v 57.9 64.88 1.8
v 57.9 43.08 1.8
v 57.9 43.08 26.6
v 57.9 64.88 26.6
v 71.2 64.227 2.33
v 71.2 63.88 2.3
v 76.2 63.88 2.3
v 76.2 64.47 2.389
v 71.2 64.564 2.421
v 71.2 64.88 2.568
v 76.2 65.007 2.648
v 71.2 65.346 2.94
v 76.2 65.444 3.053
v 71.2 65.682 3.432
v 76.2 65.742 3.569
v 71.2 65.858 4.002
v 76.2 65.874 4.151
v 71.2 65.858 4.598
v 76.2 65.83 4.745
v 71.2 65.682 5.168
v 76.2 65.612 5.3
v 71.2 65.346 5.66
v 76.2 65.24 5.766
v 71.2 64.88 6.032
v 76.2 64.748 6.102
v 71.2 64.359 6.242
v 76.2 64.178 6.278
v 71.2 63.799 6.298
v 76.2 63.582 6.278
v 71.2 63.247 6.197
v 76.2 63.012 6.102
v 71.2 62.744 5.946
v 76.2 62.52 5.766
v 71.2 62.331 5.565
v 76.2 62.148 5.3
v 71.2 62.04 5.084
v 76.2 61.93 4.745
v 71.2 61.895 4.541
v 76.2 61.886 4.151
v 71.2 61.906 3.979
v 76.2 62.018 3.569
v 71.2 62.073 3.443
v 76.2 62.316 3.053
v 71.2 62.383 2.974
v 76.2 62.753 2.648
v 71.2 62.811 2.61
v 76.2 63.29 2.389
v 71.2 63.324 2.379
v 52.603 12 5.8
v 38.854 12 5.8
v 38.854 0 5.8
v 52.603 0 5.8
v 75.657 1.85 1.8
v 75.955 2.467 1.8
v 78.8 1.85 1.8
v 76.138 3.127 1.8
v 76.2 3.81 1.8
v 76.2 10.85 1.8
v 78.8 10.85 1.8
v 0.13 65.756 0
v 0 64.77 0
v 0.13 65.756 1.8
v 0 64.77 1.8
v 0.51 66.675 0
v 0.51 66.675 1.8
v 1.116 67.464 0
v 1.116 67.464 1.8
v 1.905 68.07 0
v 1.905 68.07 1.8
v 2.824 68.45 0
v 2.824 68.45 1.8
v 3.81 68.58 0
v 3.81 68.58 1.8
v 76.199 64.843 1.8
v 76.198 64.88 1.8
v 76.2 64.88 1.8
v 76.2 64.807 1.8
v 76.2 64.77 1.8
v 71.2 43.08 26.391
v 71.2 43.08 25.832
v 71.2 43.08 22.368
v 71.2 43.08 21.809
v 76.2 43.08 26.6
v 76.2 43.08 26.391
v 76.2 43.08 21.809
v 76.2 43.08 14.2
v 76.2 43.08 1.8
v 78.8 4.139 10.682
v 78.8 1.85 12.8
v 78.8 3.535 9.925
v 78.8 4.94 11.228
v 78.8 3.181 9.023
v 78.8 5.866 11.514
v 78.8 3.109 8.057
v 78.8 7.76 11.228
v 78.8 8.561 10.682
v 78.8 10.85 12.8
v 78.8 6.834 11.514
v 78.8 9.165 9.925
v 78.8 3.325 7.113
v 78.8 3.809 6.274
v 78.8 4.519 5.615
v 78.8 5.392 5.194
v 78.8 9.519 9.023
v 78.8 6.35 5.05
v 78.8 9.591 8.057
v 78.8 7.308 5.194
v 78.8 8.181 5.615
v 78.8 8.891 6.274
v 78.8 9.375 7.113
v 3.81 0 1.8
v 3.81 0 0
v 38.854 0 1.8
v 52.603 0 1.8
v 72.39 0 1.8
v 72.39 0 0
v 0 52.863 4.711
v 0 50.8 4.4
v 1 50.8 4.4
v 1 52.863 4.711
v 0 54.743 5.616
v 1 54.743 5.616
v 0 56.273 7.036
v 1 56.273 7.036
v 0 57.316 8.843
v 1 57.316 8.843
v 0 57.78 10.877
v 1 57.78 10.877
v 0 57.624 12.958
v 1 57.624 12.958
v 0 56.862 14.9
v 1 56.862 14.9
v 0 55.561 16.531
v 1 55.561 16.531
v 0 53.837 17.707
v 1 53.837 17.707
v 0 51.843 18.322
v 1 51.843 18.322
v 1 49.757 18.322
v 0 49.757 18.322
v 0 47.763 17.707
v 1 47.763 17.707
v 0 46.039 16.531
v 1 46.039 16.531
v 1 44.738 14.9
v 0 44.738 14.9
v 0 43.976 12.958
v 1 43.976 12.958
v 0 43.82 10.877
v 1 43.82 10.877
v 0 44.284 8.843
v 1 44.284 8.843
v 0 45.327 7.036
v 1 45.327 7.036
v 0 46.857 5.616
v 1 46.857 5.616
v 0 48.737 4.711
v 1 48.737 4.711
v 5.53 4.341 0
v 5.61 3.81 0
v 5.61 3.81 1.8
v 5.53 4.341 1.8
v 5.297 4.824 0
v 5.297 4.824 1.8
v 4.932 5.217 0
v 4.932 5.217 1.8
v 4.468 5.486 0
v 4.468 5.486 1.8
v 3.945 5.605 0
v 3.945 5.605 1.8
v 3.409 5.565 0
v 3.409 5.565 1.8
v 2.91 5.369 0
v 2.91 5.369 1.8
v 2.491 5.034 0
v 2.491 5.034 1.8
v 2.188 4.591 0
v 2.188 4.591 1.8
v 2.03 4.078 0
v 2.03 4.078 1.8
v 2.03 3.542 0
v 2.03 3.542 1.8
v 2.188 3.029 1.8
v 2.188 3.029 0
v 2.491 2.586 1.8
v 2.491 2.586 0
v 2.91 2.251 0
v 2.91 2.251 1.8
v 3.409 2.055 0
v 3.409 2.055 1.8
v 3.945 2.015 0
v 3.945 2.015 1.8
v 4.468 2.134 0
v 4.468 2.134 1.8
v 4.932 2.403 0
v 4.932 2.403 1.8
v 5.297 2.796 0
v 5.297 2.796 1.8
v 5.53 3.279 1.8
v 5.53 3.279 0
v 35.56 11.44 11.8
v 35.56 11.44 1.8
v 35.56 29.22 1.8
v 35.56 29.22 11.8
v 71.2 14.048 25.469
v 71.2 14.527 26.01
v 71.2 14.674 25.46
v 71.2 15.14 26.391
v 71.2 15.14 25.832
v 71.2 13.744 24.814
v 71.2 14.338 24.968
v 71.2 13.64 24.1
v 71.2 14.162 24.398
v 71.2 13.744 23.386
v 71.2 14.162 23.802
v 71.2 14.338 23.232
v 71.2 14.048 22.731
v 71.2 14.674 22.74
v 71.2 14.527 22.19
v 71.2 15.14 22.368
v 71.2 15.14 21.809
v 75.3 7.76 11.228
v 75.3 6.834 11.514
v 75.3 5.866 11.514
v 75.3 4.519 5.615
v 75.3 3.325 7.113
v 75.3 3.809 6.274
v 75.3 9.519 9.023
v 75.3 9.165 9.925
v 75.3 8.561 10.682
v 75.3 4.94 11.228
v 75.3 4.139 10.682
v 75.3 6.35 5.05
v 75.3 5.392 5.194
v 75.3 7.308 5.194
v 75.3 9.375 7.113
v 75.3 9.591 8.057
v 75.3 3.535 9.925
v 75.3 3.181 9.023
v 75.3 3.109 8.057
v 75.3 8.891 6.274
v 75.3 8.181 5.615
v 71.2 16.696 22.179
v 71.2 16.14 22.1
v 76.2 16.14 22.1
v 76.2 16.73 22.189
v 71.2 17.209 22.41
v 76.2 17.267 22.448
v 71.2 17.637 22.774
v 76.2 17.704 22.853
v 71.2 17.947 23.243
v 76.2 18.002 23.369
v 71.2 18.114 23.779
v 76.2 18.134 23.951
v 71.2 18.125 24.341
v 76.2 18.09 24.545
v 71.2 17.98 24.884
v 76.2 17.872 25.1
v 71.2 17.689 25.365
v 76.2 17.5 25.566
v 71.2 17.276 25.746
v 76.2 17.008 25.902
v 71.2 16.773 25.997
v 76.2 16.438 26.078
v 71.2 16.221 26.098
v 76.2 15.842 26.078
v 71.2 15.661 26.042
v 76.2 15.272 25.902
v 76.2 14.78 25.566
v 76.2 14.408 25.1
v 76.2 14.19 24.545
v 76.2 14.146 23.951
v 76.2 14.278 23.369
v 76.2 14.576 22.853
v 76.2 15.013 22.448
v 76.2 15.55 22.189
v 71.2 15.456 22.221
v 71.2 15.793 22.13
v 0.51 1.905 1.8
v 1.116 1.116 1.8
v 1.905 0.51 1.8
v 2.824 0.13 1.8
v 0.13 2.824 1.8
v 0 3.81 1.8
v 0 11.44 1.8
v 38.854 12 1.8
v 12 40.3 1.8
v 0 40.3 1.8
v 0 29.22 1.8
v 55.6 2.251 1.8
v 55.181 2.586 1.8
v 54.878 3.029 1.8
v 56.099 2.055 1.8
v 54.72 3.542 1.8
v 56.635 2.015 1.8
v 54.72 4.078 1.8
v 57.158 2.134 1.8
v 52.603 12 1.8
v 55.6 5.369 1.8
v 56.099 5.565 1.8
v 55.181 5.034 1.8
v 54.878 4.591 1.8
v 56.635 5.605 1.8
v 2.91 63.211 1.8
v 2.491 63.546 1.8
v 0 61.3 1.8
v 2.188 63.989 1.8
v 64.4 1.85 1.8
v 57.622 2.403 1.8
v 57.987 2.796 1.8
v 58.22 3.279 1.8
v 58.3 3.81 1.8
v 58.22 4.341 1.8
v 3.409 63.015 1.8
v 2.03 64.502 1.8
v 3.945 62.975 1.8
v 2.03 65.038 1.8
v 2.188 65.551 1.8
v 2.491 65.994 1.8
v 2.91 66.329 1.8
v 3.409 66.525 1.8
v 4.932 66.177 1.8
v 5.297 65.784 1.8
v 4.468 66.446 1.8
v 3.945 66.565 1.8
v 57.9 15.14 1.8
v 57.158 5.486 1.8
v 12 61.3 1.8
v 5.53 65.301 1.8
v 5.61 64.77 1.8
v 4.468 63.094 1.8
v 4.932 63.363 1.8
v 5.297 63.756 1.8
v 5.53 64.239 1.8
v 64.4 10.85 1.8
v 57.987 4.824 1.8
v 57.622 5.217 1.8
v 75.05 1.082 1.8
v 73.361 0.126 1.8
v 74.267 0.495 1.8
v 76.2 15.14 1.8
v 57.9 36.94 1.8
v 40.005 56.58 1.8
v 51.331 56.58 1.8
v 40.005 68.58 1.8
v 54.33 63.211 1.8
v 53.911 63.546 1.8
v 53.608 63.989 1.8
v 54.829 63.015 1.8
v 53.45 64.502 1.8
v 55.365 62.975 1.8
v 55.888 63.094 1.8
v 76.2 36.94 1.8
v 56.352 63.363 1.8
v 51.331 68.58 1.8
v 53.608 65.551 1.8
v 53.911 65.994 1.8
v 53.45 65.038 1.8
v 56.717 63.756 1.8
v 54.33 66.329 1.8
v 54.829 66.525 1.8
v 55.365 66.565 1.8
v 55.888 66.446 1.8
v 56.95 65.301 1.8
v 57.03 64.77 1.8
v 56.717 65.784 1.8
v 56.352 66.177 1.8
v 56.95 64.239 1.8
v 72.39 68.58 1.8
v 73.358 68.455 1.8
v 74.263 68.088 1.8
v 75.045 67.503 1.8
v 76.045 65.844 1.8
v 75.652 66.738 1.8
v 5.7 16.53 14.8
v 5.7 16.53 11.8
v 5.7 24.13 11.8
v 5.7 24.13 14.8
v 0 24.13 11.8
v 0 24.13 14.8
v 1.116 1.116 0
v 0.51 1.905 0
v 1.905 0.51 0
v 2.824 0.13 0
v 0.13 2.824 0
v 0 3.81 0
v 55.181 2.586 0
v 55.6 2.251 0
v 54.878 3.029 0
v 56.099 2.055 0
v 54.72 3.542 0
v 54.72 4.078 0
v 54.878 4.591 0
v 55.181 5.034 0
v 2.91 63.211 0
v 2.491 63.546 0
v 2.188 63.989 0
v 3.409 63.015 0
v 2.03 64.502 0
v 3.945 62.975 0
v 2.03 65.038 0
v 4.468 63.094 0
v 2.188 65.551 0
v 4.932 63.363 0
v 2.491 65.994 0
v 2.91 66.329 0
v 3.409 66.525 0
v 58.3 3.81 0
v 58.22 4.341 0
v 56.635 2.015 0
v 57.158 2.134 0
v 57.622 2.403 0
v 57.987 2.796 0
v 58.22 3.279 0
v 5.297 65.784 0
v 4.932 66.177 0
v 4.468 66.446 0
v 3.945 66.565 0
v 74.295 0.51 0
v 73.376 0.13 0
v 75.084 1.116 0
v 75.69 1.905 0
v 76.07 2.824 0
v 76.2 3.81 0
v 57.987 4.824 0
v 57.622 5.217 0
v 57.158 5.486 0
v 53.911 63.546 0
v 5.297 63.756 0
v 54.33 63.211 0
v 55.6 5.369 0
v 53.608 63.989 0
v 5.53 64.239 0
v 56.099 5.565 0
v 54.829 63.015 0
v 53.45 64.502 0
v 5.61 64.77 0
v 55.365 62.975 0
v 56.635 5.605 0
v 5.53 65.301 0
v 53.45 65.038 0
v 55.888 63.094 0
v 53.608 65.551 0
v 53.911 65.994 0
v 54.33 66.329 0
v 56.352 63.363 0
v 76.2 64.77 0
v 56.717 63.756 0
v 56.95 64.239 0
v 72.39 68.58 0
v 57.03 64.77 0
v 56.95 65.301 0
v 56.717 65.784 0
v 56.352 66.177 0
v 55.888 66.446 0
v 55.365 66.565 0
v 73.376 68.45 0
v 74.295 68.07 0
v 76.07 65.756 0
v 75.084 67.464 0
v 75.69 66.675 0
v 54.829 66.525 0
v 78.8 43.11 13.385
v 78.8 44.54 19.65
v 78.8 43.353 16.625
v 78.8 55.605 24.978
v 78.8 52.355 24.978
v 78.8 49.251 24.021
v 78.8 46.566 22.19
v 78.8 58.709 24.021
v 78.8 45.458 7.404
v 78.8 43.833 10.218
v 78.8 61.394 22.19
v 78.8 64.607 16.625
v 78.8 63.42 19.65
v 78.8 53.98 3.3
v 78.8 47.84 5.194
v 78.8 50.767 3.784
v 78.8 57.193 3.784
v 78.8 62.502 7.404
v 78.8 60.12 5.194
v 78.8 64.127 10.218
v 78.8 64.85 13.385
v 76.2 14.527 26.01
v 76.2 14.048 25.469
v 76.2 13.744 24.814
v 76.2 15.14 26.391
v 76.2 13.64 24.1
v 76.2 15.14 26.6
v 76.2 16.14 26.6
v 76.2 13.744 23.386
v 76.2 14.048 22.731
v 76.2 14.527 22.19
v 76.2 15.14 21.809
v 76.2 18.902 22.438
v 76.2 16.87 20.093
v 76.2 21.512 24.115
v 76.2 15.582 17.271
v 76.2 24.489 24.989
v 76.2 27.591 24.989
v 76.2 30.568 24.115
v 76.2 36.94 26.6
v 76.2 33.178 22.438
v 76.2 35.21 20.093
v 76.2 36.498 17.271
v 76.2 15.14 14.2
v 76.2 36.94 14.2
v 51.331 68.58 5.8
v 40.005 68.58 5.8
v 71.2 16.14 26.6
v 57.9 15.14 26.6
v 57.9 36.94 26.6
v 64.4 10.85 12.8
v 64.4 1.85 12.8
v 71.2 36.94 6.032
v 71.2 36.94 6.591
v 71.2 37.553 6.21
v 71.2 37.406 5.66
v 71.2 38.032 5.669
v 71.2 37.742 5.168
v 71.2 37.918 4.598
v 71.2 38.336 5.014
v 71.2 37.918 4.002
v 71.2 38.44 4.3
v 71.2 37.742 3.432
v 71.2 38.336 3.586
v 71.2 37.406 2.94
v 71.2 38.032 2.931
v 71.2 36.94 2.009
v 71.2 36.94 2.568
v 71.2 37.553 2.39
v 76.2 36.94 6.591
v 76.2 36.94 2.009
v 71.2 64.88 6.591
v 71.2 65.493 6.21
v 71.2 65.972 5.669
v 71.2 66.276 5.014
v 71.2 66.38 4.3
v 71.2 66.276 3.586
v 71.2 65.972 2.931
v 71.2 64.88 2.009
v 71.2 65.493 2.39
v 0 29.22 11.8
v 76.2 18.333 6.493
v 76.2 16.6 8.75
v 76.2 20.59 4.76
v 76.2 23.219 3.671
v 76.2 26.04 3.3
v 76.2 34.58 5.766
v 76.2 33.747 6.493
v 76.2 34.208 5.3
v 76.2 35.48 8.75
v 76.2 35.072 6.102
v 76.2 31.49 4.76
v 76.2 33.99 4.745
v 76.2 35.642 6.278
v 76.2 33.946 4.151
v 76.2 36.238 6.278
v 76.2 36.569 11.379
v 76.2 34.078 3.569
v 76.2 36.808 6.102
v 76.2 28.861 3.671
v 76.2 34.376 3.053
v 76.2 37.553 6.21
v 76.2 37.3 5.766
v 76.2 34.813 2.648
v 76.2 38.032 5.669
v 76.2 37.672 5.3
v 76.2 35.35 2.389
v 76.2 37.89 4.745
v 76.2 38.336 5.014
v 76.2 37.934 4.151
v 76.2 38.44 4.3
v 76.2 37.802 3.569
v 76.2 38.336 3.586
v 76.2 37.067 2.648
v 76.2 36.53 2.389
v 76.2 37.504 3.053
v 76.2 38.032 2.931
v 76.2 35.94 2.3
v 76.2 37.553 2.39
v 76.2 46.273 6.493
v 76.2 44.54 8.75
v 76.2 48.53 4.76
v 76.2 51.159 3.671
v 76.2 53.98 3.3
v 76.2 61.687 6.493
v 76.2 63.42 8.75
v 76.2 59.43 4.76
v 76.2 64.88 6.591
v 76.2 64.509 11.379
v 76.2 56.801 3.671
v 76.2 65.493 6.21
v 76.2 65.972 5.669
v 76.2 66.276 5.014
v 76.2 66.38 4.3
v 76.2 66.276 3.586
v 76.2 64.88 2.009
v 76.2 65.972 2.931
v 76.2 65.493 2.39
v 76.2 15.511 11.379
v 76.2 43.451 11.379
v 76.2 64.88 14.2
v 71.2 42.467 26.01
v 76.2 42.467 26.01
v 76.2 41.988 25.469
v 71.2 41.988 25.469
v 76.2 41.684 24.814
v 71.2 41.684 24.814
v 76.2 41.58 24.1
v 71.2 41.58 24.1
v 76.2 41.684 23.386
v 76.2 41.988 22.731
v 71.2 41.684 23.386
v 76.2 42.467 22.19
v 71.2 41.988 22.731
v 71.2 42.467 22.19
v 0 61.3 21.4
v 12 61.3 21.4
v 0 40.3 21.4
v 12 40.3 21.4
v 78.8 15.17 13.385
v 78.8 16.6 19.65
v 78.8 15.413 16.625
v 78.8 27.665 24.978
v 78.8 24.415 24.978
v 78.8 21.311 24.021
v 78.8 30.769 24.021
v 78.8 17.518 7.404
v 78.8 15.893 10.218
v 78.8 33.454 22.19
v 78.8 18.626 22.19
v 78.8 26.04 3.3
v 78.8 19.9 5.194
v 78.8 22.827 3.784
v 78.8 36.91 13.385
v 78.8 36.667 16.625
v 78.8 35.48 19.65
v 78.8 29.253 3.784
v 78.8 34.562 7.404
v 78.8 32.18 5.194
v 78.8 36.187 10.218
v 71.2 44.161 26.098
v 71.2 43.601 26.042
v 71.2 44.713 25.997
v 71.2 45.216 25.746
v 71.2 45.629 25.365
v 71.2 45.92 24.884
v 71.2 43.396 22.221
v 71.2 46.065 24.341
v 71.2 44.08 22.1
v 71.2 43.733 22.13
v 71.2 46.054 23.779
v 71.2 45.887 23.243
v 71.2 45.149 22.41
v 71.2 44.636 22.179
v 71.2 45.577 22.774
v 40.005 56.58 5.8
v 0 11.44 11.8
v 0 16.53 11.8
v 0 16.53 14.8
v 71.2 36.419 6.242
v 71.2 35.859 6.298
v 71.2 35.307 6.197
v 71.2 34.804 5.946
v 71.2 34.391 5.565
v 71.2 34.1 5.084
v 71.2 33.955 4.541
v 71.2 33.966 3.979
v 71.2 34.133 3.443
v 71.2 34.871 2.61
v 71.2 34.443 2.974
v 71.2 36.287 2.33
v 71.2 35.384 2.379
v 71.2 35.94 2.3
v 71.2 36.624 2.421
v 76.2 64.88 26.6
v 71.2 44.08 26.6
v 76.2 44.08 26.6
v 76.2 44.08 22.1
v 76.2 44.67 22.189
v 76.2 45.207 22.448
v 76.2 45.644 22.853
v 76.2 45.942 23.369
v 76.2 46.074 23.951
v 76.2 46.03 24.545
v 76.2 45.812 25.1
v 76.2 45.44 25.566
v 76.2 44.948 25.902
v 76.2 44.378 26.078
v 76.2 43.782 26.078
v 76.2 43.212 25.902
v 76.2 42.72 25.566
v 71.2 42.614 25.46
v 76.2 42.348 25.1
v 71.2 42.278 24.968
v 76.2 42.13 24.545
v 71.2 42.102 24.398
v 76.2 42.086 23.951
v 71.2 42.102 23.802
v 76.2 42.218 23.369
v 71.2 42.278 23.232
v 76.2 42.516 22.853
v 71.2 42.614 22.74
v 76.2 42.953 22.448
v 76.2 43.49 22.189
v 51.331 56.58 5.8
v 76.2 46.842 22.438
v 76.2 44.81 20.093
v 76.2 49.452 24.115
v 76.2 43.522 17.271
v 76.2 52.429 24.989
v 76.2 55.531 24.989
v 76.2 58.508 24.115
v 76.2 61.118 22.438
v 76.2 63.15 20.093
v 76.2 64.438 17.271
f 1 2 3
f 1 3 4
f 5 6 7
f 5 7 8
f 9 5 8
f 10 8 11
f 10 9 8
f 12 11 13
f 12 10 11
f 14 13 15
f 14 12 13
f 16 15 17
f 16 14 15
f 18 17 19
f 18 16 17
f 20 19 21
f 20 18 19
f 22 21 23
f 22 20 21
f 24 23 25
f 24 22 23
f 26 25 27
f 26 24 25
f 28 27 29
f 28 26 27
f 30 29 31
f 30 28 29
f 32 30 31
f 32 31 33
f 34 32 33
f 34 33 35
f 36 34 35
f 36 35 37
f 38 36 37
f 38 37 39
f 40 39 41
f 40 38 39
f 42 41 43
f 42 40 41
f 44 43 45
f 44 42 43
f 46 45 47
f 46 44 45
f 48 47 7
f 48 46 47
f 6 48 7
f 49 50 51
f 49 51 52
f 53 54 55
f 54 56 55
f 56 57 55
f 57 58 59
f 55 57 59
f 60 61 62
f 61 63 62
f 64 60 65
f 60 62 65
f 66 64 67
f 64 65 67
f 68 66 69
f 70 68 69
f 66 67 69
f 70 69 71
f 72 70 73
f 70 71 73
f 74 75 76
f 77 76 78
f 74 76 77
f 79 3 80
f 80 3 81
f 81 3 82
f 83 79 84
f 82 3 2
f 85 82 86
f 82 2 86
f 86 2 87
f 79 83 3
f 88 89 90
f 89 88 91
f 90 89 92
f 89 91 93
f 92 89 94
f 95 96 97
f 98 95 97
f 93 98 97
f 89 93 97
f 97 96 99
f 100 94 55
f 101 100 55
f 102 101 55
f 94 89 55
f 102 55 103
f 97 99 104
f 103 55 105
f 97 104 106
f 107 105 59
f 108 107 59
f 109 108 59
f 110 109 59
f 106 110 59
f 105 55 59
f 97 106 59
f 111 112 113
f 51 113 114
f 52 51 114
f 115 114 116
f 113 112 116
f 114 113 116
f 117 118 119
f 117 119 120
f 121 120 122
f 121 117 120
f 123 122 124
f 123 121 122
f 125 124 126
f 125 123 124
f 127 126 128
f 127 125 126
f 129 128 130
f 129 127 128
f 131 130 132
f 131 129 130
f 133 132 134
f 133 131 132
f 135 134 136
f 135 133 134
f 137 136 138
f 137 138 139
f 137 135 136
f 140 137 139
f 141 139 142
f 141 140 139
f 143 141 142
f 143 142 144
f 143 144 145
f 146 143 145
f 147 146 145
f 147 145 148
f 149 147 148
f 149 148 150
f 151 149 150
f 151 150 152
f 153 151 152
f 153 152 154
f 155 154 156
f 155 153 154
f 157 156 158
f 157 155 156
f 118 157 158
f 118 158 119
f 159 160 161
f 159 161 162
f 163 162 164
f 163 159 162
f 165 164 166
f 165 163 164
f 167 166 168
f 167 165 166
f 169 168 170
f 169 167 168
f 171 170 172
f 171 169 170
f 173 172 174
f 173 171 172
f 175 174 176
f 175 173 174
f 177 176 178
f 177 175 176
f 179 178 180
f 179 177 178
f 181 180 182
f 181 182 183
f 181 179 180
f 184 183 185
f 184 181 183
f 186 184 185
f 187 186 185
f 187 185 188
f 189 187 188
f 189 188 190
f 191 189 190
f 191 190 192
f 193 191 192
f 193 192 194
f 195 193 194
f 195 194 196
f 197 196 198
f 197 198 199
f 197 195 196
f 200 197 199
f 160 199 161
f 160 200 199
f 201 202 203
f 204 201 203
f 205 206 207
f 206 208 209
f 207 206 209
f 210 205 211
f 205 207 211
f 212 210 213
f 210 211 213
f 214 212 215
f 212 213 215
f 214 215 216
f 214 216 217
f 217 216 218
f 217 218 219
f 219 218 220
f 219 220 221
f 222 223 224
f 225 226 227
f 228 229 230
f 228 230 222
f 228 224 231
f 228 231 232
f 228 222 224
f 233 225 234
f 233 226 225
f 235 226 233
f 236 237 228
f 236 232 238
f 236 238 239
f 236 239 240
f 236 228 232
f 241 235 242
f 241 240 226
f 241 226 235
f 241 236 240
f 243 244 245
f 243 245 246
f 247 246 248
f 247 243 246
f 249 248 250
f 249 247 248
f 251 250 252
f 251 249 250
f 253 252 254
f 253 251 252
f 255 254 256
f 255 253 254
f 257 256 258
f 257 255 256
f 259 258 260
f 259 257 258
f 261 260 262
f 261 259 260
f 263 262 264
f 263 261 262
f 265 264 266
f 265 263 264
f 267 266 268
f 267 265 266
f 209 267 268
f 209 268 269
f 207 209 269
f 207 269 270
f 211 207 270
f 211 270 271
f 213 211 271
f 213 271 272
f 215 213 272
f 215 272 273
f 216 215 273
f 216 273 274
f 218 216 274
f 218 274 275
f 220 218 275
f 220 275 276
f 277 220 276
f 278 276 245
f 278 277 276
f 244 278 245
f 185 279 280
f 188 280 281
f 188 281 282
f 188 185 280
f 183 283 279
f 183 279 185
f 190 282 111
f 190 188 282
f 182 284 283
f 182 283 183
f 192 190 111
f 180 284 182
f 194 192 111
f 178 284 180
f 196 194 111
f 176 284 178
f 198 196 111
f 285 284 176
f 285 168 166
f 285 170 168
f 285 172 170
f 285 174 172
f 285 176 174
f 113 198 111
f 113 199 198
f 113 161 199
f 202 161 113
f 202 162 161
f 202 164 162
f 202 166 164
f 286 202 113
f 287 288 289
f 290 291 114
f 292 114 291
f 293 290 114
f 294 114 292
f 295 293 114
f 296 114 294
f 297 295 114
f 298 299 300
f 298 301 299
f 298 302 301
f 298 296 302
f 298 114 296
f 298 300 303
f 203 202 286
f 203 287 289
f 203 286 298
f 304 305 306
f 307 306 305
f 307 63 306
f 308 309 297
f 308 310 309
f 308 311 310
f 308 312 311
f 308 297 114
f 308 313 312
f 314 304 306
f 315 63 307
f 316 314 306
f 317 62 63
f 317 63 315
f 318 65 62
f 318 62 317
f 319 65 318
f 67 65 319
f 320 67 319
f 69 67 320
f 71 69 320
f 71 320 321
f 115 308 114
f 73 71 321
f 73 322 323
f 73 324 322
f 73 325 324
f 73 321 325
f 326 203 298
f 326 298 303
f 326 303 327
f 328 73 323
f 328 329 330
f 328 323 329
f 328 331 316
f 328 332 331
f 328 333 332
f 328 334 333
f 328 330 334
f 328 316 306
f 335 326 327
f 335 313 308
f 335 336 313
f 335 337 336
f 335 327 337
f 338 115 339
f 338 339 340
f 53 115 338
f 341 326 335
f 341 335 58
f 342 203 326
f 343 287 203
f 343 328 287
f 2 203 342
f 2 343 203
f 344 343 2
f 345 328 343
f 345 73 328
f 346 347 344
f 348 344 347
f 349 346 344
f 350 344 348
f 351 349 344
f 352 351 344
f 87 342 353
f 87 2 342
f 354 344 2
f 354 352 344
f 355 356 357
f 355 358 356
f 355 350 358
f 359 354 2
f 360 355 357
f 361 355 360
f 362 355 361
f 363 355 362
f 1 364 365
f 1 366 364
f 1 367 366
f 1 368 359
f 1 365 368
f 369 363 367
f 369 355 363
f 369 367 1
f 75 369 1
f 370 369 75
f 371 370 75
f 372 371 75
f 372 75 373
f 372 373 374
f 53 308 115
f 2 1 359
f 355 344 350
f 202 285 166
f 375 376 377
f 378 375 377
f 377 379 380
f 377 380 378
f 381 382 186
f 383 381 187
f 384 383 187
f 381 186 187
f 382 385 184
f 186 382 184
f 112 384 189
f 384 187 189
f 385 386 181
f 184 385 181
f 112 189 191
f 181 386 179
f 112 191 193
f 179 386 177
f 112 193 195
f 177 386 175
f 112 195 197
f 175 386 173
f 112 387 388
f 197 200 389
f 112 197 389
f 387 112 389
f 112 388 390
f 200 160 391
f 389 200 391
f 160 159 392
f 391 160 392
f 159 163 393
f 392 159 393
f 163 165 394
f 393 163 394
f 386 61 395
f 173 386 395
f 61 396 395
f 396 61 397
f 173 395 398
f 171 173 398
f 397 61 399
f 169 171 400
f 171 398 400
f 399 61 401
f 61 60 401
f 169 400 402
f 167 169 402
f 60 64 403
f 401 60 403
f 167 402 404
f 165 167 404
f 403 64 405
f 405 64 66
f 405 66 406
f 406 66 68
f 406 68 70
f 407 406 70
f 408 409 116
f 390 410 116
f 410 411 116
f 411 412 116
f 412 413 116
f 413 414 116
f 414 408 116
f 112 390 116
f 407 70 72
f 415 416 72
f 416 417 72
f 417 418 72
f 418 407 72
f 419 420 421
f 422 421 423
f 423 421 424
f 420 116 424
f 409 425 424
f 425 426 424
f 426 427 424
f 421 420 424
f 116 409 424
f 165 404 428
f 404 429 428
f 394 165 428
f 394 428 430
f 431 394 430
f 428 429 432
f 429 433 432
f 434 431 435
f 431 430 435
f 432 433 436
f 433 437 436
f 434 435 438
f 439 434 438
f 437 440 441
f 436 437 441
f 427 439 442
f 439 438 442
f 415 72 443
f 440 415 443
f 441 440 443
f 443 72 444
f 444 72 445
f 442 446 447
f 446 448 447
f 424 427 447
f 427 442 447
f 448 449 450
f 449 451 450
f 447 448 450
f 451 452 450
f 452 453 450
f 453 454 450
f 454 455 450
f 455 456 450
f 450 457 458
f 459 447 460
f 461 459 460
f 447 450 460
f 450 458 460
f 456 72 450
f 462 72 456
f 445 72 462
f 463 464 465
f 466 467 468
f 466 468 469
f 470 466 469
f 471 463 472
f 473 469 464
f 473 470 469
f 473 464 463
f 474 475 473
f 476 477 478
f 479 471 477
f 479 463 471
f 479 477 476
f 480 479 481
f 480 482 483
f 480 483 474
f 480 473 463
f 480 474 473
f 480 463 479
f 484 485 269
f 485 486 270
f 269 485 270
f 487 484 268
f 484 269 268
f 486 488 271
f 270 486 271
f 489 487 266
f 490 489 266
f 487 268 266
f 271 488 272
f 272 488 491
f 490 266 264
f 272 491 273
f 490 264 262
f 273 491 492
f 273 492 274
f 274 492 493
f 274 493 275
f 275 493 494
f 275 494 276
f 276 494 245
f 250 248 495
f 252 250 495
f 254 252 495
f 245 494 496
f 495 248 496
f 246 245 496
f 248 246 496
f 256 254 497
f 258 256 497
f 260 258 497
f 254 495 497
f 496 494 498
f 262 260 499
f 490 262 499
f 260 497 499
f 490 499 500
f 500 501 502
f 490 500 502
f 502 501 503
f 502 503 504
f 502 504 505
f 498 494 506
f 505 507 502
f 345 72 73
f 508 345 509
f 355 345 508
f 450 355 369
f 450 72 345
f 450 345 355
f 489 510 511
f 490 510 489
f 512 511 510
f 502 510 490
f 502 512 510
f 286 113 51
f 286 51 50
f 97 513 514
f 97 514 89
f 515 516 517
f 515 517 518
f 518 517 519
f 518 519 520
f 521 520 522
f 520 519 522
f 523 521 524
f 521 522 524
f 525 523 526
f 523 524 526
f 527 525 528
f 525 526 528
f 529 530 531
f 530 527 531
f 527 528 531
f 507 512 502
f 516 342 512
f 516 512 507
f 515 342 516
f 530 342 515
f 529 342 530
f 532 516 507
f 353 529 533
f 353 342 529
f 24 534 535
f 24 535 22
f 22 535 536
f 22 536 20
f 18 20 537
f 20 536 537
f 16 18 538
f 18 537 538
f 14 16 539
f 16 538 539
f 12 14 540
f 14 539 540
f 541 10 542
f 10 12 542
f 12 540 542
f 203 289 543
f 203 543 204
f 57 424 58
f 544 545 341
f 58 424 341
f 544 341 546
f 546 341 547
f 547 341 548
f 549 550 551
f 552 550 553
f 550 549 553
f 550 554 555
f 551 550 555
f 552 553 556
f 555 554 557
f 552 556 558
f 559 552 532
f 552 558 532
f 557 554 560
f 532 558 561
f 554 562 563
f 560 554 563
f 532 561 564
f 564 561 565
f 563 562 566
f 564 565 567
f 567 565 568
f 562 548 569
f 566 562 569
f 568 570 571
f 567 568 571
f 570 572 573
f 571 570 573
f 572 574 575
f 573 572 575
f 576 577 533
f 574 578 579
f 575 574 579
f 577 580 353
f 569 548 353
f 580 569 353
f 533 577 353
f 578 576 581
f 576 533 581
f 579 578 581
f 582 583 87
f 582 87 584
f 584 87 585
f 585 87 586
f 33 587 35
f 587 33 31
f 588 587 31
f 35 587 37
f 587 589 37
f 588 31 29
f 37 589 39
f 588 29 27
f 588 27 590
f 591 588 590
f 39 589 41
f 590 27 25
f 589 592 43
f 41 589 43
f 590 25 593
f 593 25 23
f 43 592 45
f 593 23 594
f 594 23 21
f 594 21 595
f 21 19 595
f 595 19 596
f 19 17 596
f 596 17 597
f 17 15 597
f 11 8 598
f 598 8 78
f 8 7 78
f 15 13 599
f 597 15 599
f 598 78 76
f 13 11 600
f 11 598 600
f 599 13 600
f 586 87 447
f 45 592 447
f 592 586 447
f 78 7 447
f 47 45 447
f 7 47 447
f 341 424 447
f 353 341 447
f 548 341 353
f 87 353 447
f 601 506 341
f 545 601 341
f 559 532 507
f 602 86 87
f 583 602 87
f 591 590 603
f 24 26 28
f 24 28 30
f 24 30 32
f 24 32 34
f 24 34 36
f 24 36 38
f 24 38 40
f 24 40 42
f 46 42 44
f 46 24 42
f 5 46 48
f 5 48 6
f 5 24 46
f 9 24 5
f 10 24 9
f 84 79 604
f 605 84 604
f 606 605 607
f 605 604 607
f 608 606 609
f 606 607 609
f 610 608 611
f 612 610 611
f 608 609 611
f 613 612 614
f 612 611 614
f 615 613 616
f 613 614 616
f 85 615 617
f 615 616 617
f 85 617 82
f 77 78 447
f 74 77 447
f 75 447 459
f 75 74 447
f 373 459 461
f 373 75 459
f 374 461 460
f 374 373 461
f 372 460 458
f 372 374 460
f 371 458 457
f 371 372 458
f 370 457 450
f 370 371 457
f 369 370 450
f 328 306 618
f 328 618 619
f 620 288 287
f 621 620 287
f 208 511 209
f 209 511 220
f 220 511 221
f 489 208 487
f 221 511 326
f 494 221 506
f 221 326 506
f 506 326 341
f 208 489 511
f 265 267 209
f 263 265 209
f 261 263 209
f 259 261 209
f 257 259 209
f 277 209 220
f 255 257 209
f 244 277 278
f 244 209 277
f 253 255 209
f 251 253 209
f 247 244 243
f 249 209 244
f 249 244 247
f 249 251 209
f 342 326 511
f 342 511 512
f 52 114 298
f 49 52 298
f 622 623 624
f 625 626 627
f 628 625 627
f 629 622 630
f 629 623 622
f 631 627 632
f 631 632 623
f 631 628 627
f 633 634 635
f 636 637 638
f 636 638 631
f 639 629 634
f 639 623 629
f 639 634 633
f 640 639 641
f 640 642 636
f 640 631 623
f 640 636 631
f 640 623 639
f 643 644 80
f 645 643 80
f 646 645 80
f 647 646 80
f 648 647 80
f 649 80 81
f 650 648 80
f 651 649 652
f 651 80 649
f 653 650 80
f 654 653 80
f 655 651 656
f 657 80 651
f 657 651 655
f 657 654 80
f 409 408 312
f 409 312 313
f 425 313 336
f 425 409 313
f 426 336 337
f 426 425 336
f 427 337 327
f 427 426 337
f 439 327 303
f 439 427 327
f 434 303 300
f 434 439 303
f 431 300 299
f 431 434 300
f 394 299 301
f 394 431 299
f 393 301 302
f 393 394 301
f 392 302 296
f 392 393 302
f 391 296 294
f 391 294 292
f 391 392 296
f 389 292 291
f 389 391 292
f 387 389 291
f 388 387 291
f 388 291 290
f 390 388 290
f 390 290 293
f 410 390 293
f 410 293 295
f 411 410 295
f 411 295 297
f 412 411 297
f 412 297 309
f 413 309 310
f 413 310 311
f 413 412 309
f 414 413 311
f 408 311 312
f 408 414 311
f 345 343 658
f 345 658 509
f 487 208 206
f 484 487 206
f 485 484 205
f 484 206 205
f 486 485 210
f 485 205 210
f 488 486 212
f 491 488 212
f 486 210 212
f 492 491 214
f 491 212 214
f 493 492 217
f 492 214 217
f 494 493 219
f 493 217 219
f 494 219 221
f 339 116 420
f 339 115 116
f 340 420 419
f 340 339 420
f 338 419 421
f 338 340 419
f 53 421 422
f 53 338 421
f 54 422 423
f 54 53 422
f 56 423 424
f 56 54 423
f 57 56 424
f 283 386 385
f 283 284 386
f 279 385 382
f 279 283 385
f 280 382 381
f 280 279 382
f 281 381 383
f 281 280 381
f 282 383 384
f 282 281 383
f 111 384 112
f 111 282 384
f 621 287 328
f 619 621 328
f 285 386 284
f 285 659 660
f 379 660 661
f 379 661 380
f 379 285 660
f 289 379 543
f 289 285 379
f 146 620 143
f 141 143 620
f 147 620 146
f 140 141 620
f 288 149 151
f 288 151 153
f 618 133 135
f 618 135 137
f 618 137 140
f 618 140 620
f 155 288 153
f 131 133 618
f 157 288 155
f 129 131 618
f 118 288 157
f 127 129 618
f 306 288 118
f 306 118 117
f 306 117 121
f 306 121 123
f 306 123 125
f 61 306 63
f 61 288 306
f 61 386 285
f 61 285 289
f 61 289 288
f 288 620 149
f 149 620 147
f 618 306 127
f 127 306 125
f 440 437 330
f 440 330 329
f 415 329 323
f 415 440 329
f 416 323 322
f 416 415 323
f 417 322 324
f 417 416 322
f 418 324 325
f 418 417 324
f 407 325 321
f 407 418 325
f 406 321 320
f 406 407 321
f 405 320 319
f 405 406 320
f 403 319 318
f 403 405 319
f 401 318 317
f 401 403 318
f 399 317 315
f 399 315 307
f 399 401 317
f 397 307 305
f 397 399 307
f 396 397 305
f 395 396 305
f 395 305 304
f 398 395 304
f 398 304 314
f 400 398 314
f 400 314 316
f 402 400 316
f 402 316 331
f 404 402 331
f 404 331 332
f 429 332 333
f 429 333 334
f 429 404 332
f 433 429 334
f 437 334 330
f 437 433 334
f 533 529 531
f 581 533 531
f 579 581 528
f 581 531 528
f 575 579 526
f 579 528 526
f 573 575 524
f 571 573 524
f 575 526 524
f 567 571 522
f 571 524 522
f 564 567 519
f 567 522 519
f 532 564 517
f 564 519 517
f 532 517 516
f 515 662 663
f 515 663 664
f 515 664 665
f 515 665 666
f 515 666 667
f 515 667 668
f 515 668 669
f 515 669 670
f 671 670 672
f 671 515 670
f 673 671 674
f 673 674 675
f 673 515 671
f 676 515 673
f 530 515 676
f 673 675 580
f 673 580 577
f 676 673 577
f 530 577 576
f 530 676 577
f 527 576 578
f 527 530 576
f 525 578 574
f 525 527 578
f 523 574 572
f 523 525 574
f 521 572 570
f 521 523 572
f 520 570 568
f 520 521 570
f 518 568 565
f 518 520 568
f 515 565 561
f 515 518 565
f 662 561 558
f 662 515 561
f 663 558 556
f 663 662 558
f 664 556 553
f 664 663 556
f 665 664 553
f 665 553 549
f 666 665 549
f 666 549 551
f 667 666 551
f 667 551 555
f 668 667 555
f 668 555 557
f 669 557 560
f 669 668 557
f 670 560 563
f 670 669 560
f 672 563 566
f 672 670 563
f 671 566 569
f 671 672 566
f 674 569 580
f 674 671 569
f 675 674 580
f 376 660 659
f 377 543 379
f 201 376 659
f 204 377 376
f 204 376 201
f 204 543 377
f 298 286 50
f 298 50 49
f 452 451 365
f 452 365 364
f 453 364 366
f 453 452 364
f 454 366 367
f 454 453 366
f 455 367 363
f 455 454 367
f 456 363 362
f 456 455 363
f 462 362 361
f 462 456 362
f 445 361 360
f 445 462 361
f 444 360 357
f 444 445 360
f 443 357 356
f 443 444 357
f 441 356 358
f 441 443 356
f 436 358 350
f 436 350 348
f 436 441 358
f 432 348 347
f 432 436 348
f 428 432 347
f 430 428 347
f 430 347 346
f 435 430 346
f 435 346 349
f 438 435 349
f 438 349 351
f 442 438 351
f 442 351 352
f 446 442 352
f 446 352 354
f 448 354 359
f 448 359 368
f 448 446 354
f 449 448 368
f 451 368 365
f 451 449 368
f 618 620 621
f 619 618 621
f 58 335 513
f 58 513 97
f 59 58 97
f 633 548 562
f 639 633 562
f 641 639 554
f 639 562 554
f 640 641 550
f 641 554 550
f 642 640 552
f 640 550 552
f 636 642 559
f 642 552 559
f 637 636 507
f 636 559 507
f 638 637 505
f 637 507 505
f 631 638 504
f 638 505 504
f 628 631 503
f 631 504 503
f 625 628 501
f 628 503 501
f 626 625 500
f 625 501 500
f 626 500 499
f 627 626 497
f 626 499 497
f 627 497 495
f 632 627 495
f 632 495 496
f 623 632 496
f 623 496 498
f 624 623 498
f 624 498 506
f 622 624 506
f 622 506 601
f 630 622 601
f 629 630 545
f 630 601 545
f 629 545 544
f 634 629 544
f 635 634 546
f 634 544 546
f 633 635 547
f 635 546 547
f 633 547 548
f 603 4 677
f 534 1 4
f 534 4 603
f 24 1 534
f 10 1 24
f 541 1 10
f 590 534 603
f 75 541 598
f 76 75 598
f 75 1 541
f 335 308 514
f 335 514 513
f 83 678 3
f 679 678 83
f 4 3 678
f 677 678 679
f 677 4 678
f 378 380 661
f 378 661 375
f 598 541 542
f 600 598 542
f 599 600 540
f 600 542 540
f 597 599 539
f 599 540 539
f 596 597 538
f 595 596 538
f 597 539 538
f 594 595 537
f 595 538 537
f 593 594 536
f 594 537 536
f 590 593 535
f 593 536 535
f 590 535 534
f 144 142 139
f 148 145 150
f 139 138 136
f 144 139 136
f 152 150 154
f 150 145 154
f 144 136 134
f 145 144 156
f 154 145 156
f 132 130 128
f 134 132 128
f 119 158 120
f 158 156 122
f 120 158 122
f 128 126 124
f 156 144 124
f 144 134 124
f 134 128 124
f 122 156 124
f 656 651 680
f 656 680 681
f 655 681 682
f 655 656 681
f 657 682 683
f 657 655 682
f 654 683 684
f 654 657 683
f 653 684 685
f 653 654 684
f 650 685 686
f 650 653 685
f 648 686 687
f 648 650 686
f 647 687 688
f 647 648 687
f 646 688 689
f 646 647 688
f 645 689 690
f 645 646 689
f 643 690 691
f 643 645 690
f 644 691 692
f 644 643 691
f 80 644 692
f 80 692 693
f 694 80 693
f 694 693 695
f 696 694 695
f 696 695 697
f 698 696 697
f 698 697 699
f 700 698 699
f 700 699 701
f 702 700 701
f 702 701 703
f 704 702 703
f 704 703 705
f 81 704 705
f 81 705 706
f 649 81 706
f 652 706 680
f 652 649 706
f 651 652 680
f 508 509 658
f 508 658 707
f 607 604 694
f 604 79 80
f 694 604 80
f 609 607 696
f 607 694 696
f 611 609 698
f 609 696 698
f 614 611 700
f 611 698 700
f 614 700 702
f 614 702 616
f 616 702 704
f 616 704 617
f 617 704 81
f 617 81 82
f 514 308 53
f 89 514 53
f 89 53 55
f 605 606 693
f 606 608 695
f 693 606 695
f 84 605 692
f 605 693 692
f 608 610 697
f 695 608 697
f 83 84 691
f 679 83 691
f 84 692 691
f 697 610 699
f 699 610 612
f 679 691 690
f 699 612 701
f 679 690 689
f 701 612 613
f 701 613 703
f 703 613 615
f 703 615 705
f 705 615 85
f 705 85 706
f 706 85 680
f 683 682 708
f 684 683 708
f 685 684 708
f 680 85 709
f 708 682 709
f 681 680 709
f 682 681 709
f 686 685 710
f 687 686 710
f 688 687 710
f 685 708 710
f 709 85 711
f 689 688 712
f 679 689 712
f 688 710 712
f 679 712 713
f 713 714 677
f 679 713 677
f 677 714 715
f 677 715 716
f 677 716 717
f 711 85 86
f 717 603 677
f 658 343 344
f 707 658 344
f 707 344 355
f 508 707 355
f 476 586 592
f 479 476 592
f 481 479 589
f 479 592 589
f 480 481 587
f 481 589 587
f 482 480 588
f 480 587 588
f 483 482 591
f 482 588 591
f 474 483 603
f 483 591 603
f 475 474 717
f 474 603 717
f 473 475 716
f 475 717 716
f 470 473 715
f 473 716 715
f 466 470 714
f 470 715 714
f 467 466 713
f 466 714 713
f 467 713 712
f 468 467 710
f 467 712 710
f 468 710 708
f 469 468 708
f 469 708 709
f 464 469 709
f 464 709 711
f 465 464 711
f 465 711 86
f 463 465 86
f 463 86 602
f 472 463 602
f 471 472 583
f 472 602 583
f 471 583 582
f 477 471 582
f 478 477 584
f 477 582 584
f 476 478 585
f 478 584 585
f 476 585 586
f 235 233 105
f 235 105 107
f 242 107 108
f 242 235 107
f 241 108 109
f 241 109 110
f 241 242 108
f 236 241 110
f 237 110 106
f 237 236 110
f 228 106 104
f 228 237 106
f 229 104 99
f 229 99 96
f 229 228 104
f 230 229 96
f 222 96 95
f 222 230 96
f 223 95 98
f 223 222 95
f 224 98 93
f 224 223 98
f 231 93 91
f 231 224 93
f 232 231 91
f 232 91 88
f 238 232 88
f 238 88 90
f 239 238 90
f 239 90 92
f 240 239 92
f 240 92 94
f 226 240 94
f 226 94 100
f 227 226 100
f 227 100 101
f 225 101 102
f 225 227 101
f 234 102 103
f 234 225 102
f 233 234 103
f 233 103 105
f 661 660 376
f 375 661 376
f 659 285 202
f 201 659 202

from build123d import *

# Parameters (mm, degrees)
CYLINDER004_R     = 7
CYLINDER004_DEPTH = 1
BOX003_W          = 12
BOX003_H          = 21
BOX003_DEPTH      = 19.6
BOX002_W          = 5.7
BOX002_H          = 7.6
BOX002_DEPTH      = 3
BOX001_W          = 35.56
BOX001_H          = 17.78
BOX001_DEPTH      = 10
BOX004_W          = 13.749
BOX004_H          = 12
BOX004_DEPTH      = 4
BOX005_W          = 11.3259
BOX005_H          = 12
BOX005_DEPTH      = 4
CYLINDER005_R     = 3.25
CYLINDER005_DEPTH = 3.5
BOX006_W          = 14.4
BOX006_H          = 9
BOX006_DEPTH      = 11
CYLINDER007_R     = 2
CYLINDER007_DEPTH = 5
CYLINDER006_R     = 2
CYLINDER006_DEPTH = 5
CYLINDER009_R     = 2.5
CYLINDER009_DEPTH = 5
CYLINDER008_R     = 10.9
CYLINDER008_DEPTH = 2.6
BOX007_W          = 18.3
BOX007_H          = 21.8
BOX007_DEPTH      = 24.8
CYLINDER010_R     = 2.5
CYLINDER010_DEPTH = 5
CYLINDER001_R     = 1.8
CYLINDER001_DEPTH = 1.8
CYLINDER002_R     = 1.8
CYLINDER002_DEPTH = 1.8
CYLINDER003_R     = 1.8
CYLINDER003_DEPTH = 1.8
CYLINDER_R        = 1.8
CYLINDER_DEPTH    = 1.8
BOX_W             = 76.2
BOX_H             = 68.58
BOX_DEPTH         = 1.8
FILLET_R          = 3.81
CYLINDER015_R     = 2
CYLINDER015_DEPTH = 5
CYLINDER011_R     = 2
CYLINDER011_DEPTH = 5
CYLINDER012_R     = 2.5
CYLINDER012_DEPTH = 5
CYLINDER014_R     = 10.9
CYLINDER014_DEPTH = 2.6
BOX008_W          = 18.3
BOX008_H          = 21.8
BOX008_DEPTH      = 24.8
CYLINDER013_R     = 2.5
CYLINDER013_DEPTH = 5


with BuildPart() as cylinder004:
    # Cylinder004 → Cylinder004 (new body)
    with BuildSketch(Plane(origin=(0, 50.8, 11.4), x_dir=(0, 0, -1), z_dir=(1, 0, 0))):
        Circle(CYLINDER004_R)
    extrude(amount=CYLINDER004_DEPTH)


with BuildPart() as midi:
    # Box003 → Box003 (new body)
    with BuildSketch(Plane(origin=(0, 40.3, 1.8), x_dir=(1, 0, 0), z_dir=(0, 0, 1))):
        with Locations((6, 10.5)):
            Rectangle(BOX003_W, BOX003_H)
    extrude(amount=BOX003_DEPTH)

    # Cut001: cut Cylinder004
    add(cylinder004.part, mode=Mode.SUBTRACT)


with BuildPart() as cube002:
    # Box002 → Box002 (new body)
    with BuildSketch(Plane(origin=(0, 16.53, 11.8), x_dir=(1, 0, 0), z_dir=(0, 0, 1))):
        with Locations((2.85, 3.8)):
            Rectangle(BOX002_W, BOX002_H)
    extrude(amount=BOX002_DEPTH)


with BuildPart() as itsybitsy:
    # Box001 → Box001 (new body)
    with BuildSketch(Plane(origin=(0, 11.44, 1.8), x_dir=(1, 0, 0), z_dir=(0, 0, 1))):
        with Locations((17.78, 8.89)):
            Rectangle(BOX001_W, BOX001_H)
    extrude(amount=BOX001_DEPTH)

    # Fusion001: union Cube002
    add(cube002.part)


with BuildPart() as rgbw:
    # Box004 → Box004 (new body)
    with BuildSketch(Plane(origin=(38.8544, 0, 1.8), x_dir=(1, 0, 0), z_dir=(0, 0, 1))):
        with Locations((6.8745, 6)):
            Rectangle(BOX004_W, BOX004_H)
    extrude(amount=BOX004_DEPTH)


with BuildPart() as argb:
    # Box005 → Box005 (new body)
    with BuildSketch(Plane(origin=(40.005, 56.58, 1.8), x_dir=(1, 0, 0), z_dir=(0, 0, 1))):
        with Locations((5.66295, 6)):
            Rectangle(BOX005_W, BOX005_H)
    extrude(amount=BOX005_DEPTH)


with BuildPart() as cylinder005:
    # Cylinder005 → Cylinder005 (new body)
    with BuildSketch(Plane(origin=(10.9, 4.5, 8.3), x_dir=(0, 0, -1), z_dir=(1, 0, 0))):
        Circle(CYLINDER005_R)
    extrude(amount=CYLINDER005_DEPTH)


with BuildPart() as dc_jack:
    # Box006 → Box006 (new body)
    with BuildSketch(Plane.XY.offset(1.8)):
        with Locations((7.2, 4.5)):
            Rectangle(BOX006_W, BOX006_H)
    extrude(amount=BOX006_DEPTH)

    # Cut002: cut Cylinder005
    add(cylinder005.part, mode=Mode.SUBTRACT)


with BuildPart() as dc_jack_1:
    # Cut002 placement: moved
    add(dc_jack.part.moved(Location((64.4, 1.85, 0))))


with BuildPart() as cylinder007:
    # Cylinder007 → Cylinder007 (new body)
    with BuildSketch(Plane(origin=(13.3, 20.8, 2.5), x_dir=(0, 0, -1), z_dir=(1, 0, 0))):
        Circle(CYLINDER007_R)
    extrude(amount=CYLINDER007_DEPTH)


with BuildPart() as fusion003:
    # Cylinder006 → Cylinder006 (new body)
    with BuildSketch(Plane(origin=(13.3, 1, 22.3), x_dir=(0, 0, -1), z_dir=(1, 0, 0))):
        Circle(CYLINDER006_R)
    extrude(amount=CYLINDER006_DEPTH)

    # Fusion003: union Cylinder007
    add(cylinder007.part)


with BuildPart() as cylinder009:
    # Cylinder009 → Cylinder009 (new body)
    with BuildSketch(Plane(origin=(13.3, 1, 22.3), x_dir=(0, 0, -1), z_dir=(1, 0, 0))):
        Circle(CYLINDER009_R)
    extrude(amount=CYLINDER009_DEPTH)


with BuildPart() as cylinder008:
    # Cylinder008 → Cylinder008 (new body)
    with BuildSketch(Plane(origin=(18.3, 10.9, 12.4), x_dir=(0, 0, -1), z_dir=(1, 0, 0))):
        Circle(CYLINDER008_R)
    extrude(amount=CYLINDER008_DEPTH)


with BuildPart() as cube005:
    # Box007 → Box007 (new body)
    with BuildSketch(Plane.XY):
        with Locations((9.15, 10.9)):
            Rectangle(BOX007_W, BOX007_H)
    extrude(amount=BOX007_DEPTH)


with BuildPart() as dmx_xlr:
    # Cylinder010 → Cylinder010 (new body)
    with BuildSketch(Plane(origin=(13.3, 20.8, 2.5), x_dir=(0, 0, -1), z_dir=(1, 0, 0))):
        Circle(CYLINDER010_R)
    extrude(amount=CYLINDER010_DEPTH)

    # Fusion002: union Cylinder009, Cylinder008, Cube005
    add(cylinder009.part)
    add(cylinder008.part)
    add(cube005.part)

    # Cut003: cut Fusion003
    add(fusion003.part, mode=Mode.SUBTRACT)


with BuildPart() as dmx_xlr_1:
    # Cut003 placement: moved
    add(dmx_xlr.part.moved(Location((57.9, 15.14, 1.8))))


with BuildPart() as cylinder001:
    # Cylinder001 → Cylinder001 (new body)
    with BuildSketch(Plane(origin=(3.81, 64.77, 0), x_dir=(1, 0, 0), z_dir=(0, 0, 1))):
        Circle(CYLINDER001_R)
    extrude(amount=CYLINDER001_DEPTH)


with BuildPart() as cylinder002:
    # Cylinder002 → Cylinder002 (new body)
    with BuildSketch(Plane(origin=(56.5, 3.81, 0), x_dir=(1, 0, 0), z_dir=(0, 0, 1))):
        Circle(CYLINDER002_R)
    extrude(amount=CYLINDER002_DEPTH)


with BuildPart() as cylinder003:
    # Cylinder003 → Cylinder003 (new body)
    with BuildSketch(Plane(origin=(55.23, 64.77, 0), x_dir=(1, 0, 0), z_dir=(0, 0, 1))):
        Circle(CYLINDER003_R)
    extrude(amount=CYLINDER003_DEPTH)


with BuildPart() as fusion:
    # Cylinder → Cylinder (new body)
    with BuildSketch(Plane(origin=(3.81, 3.81, 0), x_dir=(1, 0, 0), z_dir=(0, 0, 1))):
        Circle(CYLINDER_R)
    extrude(amount=CYLINDER_DEPTH)

    # Fusion: union Cylinder001, Cylinder002, Cylinder003
    add(cylinder001.part)
    add(cylinder002.part)
    add(cylinder003.part)


with BuildPart() as pcb:
    # Box → Box (new body)
    with BuildSketch(Plane.XY):
        with Locations((38.1, 34.29)):
            Rectangle(BOX_W, BOX_H)
    extrude(amount=BOX_DEPTH)

    # Fillet
    fillet_edges = [pcb.edges().sort_by_distance(p)[0] for p in [
        (0, 0, 0.9),
        (0, 68.58, 0.9),
        (76.2, 0, 0.9),
        (76.2, 68.58, 0.9),
    ]]
    fillet(fillet_edges, radius=FILLET_R)

    # Cut: cut Fusion
    add(fusion.part, mode=Mode.SUBTRACT)


with BuildPart() as cylinder015:
    # Cylinder015 → Cylinder015 (new body)
    with BuildSketch(Plane(origin=(13.3, 20.8, 2.5), x_dir=(0, 0, -1), z_dir=(1, 0, 0))):
        Circle(CYLINDER015_R)
    extrude(amount=CYLINDER015_DEPTH)


with BuildPart() as fusion004:
    # Cylinder011 → Cylinder011 (new body)
    with BuildSketch(Plane(origin=(13.3, 1, 22.3), x_dir=(0, 0, -1), z_dir=(1, 0, 0))):
        Circle(CYLINDER011_R)
    extrude(amount=CYLINDER011_DEPTH)

    # Fusion004: union Cylinder015
    add(cylinder015.part)


with BuildPart() as cylinder012:
    # Cylinder012 → Cylinder012 (new body)
    with BuildSketch(Plane(origin=(13.3, 1, 22.3), x_dir=(0, 0, -1), z_dir=(1, 0, 0))):
        Circle(CYLINDER012_R)
    extrude(amount=CYLINDER012_DEPTH)


with BuildPart() as cylinder014:
    # Cylinder014 → Cylinder014 (new body)
    with BuildSketch(Plane(origin=(18.3, 10.9, 12.4), x_dir=(0, 0, -1), z_dir=(1, 0, 0))):
        Circle(CYLINDER014_R)
    extrude(amount=CYLINDER014_DEPTH)


with BuildPart() as cube006:
    # Box008 → Box008 (new body)
    with BuildSketch(Plane.XY):
        with Locations((9.15, 10.9)):
            Rectangle(BOX008_W, BOX008_H)
    extrude(amount=BOX008_DEPTH)


with BuildPart() as device:
    # Cylinder013 → Cylinder013 (new body)
    with BuildSketch(Plane(origin=(13.3, 20.8, 2.5), x_dir=(0, 0, -1), z_dir=(1, 0, 0))):
        Circle(CYLINDER013_R)
    extrude(amount=CYLINDER013_DEPTH)

    # Fusion005: union Cylinder012, Cylinder014, Cube006
    add(cylinder012.part)
    add(cylinder014.part)
    add(cube006.part)

    # Cut004: cut Fusion004
    add(fusion004.part, mode=Mode.SUBTRACT)


with BuildPart() as device_1:
    # Cut004 placement: moved
    add(device.part.moved(Location((57.9, 43.08, 1.8))))

    # Fusion006: union Midi, ItsyBitsy, RGBW, ARGB, DC Jack, DMX XLR, PCB
    add(midi.part)
    add(itsybitsy.part)
    add(rgbw.part)
    add(argb.part)
    add(dc_jack_1.part)
    add(dmx_xlr_1.part)
    add(pcb.part)


solid = device_1.part
